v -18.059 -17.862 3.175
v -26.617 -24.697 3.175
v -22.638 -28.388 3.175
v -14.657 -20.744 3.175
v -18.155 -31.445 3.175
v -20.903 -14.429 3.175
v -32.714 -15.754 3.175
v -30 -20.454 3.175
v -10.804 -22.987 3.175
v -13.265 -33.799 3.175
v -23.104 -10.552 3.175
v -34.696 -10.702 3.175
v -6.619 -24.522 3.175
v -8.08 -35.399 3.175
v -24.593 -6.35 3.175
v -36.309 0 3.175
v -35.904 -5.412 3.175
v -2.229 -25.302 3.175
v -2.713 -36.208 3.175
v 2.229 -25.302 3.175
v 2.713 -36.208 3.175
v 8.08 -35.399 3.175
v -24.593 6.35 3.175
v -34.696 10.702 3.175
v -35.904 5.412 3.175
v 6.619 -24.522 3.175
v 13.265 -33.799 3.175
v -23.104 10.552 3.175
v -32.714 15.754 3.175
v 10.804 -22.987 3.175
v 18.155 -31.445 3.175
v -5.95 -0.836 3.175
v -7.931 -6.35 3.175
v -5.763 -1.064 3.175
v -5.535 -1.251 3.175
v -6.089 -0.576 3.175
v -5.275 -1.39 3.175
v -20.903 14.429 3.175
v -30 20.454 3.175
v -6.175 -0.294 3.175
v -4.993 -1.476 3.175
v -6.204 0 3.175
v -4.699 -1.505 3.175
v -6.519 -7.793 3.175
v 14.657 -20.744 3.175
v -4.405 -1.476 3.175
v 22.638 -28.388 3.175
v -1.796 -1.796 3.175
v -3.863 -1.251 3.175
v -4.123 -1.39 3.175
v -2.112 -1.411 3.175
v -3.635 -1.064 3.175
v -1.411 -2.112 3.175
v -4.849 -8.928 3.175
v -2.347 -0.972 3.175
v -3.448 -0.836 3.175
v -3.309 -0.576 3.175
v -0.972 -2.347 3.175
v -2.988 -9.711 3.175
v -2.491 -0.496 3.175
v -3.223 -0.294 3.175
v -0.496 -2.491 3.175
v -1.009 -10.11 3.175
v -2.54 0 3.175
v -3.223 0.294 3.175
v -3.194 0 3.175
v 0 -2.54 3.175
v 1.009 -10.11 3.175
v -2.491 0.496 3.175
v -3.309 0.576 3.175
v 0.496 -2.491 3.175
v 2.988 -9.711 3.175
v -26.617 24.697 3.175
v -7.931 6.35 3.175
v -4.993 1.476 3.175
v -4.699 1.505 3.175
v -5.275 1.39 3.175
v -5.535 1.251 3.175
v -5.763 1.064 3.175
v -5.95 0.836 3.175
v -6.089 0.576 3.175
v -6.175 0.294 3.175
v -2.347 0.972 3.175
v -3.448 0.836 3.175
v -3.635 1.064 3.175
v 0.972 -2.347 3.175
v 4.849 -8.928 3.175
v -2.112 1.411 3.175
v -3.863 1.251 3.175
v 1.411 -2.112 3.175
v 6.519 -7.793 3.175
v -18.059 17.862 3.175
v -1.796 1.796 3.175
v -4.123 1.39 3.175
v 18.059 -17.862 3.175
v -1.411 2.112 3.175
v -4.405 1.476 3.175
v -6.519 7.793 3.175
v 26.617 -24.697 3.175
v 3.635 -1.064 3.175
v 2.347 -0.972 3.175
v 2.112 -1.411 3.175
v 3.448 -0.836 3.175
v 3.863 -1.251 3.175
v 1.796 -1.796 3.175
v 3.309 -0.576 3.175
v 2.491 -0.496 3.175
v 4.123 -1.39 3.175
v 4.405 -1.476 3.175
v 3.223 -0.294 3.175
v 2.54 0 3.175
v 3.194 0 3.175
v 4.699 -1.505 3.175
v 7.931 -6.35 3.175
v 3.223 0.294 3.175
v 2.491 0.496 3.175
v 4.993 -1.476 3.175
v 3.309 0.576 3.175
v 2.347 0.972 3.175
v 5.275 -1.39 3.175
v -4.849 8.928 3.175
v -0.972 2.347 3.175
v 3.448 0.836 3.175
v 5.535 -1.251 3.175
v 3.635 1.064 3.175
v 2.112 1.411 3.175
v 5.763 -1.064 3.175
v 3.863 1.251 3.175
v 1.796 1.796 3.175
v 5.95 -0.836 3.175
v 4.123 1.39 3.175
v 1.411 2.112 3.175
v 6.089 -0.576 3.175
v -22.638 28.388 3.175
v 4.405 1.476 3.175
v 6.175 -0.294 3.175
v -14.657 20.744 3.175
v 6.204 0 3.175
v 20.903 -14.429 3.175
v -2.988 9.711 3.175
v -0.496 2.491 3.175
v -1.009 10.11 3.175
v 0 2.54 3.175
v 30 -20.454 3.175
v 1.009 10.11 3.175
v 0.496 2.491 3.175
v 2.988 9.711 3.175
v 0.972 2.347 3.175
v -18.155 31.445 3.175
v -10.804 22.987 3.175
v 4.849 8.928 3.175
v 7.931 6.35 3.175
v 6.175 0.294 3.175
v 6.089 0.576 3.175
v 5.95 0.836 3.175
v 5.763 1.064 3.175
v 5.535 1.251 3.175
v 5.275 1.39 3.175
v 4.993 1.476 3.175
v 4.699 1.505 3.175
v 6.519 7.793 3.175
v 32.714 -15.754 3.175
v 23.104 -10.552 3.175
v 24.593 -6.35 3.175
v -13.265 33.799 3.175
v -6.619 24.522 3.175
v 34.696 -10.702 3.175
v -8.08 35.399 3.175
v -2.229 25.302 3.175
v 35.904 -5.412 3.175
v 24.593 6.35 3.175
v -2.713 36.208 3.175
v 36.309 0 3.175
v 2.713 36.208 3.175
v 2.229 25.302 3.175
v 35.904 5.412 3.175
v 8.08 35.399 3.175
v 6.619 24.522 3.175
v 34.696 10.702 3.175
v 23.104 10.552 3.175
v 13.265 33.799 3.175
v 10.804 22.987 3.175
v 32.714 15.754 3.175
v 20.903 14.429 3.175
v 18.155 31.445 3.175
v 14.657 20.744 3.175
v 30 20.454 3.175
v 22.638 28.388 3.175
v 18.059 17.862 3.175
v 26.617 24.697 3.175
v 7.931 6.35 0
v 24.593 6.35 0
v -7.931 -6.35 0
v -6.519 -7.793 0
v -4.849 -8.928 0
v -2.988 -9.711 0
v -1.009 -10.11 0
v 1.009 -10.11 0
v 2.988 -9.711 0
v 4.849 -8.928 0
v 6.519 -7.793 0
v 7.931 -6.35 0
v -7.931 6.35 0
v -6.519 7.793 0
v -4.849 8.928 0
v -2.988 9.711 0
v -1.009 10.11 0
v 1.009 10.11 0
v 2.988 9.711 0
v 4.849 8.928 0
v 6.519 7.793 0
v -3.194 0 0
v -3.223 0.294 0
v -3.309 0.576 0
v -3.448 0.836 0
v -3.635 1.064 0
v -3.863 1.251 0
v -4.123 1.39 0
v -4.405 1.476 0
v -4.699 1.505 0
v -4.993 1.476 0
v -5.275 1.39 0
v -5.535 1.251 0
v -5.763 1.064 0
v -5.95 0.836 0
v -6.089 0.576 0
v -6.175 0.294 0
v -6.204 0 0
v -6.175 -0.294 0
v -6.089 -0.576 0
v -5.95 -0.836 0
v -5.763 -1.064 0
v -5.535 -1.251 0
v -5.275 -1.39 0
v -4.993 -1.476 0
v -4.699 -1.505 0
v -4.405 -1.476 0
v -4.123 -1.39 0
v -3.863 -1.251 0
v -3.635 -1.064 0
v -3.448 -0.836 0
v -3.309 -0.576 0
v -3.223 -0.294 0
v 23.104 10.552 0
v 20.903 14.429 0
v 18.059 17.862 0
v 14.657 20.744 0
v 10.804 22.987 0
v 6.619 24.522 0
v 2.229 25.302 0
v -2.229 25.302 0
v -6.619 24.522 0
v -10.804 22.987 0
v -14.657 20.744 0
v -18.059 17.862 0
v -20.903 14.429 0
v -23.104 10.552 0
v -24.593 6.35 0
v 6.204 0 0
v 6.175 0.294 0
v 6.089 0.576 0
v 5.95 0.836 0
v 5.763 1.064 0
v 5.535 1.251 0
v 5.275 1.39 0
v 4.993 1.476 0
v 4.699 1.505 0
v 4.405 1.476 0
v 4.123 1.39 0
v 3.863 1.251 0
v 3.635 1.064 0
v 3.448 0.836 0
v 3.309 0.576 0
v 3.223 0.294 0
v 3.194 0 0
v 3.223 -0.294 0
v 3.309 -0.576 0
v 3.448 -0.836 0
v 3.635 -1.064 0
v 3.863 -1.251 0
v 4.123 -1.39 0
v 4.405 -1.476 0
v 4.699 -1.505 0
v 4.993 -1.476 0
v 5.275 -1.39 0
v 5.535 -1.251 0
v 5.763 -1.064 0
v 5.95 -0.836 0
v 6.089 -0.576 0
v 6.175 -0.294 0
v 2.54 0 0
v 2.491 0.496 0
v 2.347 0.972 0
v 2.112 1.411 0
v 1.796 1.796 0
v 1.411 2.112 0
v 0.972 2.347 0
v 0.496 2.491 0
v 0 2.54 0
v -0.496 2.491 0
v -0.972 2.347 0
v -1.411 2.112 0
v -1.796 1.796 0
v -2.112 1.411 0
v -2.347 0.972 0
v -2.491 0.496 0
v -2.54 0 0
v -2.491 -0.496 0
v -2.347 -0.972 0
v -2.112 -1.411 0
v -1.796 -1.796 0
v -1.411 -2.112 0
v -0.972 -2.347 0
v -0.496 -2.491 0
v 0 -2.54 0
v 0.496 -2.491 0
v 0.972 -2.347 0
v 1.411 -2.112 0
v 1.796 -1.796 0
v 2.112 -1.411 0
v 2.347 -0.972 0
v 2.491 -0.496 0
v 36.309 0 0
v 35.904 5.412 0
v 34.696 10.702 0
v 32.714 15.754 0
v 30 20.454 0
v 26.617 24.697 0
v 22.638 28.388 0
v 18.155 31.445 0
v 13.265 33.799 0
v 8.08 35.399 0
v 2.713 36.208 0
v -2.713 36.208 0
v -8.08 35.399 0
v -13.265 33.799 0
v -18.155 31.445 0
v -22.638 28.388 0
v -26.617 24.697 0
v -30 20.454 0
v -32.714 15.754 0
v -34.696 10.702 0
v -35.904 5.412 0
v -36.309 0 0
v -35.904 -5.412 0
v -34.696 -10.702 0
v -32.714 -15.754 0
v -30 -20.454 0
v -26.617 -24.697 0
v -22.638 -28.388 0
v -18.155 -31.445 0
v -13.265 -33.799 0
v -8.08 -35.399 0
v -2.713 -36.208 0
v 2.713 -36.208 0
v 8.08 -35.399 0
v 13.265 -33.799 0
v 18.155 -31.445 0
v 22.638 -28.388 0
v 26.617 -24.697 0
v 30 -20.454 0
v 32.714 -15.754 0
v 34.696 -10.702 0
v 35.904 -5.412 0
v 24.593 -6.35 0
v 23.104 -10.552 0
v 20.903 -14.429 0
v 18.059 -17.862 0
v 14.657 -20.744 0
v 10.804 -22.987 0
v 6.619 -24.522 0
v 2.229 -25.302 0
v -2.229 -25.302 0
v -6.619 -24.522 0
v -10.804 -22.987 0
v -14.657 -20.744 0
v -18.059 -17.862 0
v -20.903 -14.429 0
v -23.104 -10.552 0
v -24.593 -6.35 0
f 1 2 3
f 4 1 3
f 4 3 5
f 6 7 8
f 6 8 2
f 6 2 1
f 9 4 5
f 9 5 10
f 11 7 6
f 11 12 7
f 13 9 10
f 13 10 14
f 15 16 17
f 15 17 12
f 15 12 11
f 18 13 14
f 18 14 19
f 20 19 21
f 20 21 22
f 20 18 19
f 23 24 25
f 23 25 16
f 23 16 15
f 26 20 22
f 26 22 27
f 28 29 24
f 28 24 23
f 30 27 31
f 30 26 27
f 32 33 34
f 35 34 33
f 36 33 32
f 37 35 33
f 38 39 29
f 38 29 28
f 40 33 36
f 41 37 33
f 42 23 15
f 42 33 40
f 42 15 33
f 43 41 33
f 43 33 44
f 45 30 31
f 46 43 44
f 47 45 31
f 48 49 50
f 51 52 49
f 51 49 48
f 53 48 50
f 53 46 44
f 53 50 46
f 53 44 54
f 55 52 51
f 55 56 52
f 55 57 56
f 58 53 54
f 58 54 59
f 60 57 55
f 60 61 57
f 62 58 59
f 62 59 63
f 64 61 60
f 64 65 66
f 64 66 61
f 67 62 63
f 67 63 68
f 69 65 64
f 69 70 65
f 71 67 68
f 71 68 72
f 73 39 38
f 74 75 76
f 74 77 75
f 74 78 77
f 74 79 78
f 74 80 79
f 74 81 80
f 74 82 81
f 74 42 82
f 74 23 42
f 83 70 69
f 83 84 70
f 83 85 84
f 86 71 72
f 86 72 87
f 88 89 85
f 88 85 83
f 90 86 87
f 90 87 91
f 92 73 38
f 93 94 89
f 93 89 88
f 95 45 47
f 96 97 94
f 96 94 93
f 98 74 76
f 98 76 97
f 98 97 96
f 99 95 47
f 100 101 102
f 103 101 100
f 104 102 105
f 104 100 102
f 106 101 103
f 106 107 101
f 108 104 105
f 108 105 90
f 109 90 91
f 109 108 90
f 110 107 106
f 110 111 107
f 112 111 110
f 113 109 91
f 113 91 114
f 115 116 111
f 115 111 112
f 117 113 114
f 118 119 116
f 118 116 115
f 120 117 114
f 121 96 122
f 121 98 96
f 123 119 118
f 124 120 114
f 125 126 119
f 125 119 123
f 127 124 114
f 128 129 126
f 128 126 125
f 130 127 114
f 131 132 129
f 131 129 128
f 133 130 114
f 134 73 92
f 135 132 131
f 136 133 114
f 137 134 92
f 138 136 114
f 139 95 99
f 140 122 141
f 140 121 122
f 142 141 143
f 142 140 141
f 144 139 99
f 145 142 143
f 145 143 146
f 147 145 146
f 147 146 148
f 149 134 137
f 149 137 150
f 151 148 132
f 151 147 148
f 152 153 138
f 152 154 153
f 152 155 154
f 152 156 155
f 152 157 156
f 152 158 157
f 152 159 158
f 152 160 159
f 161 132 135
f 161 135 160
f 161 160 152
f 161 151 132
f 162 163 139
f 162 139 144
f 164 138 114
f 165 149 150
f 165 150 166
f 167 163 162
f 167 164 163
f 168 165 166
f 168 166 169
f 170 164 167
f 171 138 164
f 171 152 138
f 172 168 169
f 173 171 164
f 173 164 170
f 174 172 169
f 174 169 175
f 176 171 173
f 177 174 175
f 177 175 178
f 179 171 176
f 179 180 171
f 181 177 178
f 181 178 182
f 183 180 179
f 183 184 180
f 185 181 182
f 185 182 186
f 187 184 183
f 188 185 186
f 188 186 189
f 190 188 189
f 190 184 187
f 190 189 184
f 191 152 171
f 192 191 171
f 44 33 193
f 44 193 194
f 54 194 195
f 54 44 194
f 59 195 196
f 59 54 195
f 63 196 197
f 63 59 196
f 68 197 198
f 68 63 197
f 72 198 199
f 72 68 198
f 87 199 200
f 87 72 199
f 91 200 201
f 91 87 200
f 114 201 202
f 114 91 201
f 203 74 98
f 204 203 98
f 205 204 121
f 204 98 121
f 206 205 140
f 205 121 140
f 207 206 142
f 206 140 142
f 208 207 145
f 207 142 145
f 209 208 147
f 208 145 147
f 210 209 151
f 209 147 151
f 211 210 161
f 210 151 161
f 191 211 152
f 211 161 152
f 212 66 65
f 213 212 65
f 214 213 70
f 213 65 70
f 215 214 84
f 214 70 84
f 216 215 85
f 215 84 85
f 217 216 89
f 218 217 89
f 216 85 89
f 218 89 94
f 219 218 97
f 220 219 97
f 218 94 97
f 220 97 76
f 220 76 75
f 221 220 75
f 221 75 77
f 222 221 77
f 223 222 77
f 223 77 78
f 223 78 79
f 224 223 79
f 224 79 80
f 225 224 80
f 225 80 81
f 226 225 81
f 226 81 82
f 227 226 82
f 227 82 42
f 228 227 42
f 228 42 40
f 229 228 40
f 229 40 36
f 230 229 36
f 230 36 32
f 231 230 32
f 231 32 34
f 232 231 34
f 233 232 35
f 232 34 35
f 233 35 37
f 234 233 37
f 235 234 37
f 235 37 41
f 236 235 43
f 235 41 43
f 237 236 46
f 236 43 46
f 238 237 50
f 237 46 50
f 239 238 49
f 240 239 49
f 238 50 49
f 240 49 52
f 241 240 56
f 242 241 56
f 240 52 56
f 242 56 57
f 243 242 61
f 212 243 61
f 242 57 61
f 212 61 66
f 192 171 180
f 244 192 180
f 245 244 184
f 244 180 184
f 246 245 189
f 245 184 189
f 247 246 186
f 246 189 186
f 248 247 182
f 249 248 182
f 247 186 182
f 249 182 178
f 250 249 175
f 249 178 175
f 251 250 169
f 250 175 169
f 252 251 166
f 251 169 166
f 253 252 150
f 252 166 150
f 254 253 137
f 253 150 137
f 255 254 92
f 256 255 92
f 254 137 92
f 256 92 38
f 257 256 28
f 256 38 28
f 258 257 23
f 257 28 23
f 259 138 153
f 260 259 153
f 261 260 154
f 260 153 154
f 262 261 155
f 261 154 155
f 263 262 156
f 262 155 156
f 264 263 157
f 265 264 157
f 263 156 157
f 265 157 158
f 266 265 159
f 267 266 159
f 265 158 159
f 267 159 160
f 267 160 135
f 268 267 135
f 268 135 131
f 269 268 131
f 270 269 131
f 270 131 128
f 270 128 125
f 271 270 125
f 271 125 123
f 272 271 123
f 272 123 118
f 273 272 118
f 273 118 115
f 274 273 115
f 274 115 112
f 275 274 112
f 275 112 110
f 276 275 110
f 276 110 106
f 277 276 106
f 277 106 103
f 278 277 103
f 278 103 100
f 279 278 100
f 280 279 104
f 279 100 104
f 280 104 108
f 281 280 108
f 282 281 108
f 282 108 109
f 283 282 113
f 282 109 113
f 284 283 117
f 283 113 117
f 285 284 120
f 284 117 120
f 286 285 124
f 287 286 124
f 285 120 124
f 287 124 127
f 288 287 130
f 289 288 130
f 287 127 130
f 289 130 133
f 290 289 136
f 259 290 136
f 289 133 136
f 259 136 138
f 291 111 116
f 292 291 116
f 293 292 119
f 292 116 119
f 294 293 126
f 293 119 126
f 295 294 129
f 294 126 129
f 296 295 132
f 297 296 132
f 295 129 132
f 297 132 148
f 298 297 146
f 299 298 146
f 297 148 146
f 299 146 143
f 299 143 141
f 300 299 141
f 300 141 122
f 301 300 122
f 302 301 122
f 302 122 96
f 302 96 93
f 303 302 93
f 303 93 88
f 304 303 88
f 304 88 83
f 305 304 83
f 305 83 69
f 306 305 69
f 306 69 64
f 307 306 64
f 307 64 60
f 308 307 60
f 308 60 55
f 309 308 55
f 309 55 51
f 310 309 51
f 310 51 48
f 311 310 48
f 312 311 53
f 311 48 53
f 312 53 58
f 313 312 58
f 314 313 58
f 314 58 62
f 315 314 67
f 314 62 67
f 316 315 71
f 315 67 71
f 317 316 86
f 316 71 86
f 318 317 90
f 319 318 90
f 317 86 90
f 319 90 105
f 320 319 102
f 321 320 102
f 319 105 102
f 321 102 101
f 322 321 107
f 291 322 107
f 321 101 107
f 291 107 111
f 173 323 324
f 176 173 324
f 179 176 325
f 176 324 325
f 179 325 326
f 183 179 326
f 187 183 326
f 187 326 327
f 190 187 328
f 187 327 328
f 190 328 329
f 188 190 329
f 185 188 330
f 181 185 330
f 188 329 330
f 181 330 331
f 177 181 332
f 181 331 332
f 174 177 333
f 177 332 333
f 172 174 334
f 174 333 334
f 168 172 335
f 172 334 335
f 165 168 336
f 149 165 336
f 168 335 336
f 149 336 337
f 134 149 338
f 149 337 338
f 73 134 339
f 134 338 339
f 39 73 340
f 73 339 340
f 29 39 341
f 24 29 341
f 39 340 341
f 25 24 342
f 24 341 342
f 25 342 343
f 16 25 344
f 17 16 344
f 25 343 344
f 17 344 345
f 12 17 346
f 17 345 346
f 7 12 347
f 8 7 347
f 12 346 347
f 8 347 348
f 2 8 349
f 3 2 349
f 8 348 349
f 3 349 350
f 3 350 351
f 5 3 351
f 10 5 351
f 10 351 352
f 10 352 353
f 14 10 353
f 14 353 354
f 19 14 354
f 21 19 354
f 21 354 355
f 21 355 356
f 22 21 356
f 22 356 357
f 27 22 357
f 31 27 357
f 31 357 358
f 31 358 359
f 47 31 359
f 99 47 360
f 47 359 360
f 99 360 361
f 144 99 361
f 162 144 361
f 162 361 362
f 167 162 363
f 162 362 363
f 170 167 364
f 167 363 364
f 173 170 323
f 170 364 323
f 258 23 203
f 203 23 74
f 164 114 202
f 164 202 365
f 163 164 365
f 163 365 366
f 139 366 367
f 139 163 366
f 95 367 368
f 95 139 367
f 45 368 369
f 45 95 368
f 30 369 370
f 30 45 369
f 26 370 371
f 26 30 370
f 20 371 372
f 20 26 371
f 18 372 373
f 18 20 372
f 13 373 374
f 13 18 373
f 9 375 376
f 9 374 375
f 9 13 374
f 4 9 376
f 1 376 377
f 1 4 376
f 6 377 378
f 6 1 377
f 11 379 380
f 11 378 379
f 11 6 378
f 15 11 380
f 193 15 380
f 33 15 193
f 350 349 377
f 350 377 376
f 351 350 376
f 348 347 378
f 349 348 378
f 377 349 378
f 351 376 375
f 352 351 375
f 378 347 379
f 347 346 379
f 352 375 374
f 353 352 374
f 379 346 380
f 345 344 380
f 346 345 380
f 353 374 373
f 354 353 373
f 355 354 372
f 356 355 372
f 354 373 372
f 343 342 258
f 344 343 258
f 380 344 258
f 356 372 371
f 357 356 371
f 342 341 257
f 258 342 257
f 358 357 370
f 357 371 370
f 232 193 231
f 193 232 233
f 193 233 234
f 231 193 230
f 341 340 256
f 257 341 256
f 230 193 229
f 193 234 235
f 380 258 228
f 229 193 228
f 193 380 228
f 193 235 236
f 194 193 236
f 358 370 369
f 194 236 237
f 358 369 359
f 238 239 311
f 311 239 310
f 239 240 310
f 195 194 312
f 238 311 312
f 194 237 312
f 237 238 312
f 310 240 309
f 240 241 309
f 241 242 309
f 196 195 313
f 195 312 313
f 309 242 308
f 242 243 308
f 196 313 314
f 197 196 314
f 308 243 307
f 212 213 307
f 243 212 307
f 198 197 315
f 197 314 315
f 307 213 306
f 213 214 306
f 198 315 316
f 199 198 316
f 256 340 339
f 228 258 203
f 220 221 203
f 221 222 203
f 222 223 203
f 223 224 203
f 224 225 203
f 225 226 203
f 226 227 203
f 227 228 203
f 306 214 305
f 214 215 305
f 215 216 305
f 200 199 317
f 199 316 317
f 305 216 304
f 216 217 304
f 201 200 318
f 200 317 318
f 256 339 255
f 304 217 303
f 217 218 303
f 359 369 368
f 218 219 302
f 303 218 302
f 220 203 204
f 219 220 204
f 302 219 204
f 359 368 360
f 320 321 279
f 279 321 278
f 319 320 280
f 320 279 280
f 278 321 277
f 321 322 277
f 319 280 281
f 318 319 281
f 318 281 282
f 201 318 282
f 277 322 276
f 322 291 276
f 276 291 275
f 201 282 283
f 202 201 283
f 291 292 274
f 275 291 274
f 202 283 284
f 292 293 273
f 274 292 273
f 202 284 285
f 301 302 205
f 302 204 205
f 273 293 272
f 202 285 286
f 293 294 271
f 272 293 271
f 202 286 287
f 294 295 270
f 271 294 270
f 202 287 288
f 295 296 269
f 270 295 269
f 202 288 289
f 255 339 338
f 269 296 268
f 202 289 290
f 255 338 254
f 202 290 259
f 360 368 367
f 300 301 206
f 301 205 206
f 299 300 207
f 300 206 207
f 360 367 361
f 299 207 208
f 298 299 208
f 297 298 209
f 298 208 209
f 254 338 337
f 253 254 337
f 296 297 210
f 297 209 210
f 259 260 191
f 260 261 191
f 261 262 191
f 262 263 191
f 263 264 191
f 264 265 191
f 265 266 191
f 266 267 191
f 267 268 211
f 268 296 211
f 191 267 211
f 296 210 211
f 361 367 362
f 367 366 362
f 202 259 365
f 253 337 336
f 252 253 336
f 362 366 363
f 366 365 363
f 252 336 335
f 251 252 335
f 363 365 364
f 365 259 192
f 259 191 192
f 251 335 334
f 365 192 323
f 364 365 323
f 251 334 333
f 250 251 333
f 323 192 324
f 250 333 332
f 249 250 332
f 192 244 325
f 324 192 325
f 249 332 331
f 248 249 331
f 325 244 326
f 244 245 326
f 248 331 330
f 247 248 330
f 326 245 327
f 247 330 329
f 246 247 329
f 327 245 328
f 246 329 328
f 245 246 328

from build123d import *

# Parameters (mm, degrees)
SKETCH1_R           = 36.3093
BOSS_EXTRUDE1_DEPTH = 3.175
CUT_EXTRUDE1_DEPTH  = 52.44716861
SKETCH3_R           = 1.505
SKETCH3_R_2         = 2.54
CUT_EXTRUDE2_DEPTH  = 52.44716861


with BuildPart() as part:
    # Sketch1 → Boss-Extrude1 (new body)
    with BuildSketch(Plane.XY):
        Circle(SKETCH1_R)
    extrude(amount=BOSS_EXTRUDE1_DEPTH)

    # Sketch2 → Cut-Extrude1 (cut, through all)
    with BuildSketch(Plane.XY.offset(3.175)):
        with BuildLine():
            Line((-24.593444248, -6.35), (-7.931147458, -6.35))
            ThreePointArc((-7.931147458, -6.35), (0, -10.16), (7.931147458, -6.35))
            Line((7.931147458, -6.35), (24.593444248, -6.35))
            ThreePointArc((24.593444248, -6.35), (0, -25.4), (-24.593444248, -6.35))
        make_face()
        with BuildLine():
            Line((7.931147458, 6.35), (24.593444248, 6.35))
            ThreePointArc((24.593444248, 6.35), (0, 25.4), (-24.593444248, 6.35))
            Line((-24.593444248, 6.35), (-7.931147458, 6.35))
            ThreePointArc((-7.931147458, 6.35), (0, 10.16), (7.931147458, 6.35))
        make_face()
    extrude(amount=-CUT_EXTRUDE1_DEPTH, mode=Mode.SUBTRACT)

    # Sketch3 → Cut-Extrude2 (cut, through all)
    with BuildSketch(Plane.XY.offset(3.175)):
        with Locations((-4.699, 0)):
            Circle(SKETCH3_R)
        with Locations((4.699, 0)):
            Circle(SKETCH3_R)
        Circle(SKETCH3_R_2)
    extrude(amount=-CUT_EXTRUDE2_DEPTH, mode=Mode.SUBTRACT)


solid = part.part
